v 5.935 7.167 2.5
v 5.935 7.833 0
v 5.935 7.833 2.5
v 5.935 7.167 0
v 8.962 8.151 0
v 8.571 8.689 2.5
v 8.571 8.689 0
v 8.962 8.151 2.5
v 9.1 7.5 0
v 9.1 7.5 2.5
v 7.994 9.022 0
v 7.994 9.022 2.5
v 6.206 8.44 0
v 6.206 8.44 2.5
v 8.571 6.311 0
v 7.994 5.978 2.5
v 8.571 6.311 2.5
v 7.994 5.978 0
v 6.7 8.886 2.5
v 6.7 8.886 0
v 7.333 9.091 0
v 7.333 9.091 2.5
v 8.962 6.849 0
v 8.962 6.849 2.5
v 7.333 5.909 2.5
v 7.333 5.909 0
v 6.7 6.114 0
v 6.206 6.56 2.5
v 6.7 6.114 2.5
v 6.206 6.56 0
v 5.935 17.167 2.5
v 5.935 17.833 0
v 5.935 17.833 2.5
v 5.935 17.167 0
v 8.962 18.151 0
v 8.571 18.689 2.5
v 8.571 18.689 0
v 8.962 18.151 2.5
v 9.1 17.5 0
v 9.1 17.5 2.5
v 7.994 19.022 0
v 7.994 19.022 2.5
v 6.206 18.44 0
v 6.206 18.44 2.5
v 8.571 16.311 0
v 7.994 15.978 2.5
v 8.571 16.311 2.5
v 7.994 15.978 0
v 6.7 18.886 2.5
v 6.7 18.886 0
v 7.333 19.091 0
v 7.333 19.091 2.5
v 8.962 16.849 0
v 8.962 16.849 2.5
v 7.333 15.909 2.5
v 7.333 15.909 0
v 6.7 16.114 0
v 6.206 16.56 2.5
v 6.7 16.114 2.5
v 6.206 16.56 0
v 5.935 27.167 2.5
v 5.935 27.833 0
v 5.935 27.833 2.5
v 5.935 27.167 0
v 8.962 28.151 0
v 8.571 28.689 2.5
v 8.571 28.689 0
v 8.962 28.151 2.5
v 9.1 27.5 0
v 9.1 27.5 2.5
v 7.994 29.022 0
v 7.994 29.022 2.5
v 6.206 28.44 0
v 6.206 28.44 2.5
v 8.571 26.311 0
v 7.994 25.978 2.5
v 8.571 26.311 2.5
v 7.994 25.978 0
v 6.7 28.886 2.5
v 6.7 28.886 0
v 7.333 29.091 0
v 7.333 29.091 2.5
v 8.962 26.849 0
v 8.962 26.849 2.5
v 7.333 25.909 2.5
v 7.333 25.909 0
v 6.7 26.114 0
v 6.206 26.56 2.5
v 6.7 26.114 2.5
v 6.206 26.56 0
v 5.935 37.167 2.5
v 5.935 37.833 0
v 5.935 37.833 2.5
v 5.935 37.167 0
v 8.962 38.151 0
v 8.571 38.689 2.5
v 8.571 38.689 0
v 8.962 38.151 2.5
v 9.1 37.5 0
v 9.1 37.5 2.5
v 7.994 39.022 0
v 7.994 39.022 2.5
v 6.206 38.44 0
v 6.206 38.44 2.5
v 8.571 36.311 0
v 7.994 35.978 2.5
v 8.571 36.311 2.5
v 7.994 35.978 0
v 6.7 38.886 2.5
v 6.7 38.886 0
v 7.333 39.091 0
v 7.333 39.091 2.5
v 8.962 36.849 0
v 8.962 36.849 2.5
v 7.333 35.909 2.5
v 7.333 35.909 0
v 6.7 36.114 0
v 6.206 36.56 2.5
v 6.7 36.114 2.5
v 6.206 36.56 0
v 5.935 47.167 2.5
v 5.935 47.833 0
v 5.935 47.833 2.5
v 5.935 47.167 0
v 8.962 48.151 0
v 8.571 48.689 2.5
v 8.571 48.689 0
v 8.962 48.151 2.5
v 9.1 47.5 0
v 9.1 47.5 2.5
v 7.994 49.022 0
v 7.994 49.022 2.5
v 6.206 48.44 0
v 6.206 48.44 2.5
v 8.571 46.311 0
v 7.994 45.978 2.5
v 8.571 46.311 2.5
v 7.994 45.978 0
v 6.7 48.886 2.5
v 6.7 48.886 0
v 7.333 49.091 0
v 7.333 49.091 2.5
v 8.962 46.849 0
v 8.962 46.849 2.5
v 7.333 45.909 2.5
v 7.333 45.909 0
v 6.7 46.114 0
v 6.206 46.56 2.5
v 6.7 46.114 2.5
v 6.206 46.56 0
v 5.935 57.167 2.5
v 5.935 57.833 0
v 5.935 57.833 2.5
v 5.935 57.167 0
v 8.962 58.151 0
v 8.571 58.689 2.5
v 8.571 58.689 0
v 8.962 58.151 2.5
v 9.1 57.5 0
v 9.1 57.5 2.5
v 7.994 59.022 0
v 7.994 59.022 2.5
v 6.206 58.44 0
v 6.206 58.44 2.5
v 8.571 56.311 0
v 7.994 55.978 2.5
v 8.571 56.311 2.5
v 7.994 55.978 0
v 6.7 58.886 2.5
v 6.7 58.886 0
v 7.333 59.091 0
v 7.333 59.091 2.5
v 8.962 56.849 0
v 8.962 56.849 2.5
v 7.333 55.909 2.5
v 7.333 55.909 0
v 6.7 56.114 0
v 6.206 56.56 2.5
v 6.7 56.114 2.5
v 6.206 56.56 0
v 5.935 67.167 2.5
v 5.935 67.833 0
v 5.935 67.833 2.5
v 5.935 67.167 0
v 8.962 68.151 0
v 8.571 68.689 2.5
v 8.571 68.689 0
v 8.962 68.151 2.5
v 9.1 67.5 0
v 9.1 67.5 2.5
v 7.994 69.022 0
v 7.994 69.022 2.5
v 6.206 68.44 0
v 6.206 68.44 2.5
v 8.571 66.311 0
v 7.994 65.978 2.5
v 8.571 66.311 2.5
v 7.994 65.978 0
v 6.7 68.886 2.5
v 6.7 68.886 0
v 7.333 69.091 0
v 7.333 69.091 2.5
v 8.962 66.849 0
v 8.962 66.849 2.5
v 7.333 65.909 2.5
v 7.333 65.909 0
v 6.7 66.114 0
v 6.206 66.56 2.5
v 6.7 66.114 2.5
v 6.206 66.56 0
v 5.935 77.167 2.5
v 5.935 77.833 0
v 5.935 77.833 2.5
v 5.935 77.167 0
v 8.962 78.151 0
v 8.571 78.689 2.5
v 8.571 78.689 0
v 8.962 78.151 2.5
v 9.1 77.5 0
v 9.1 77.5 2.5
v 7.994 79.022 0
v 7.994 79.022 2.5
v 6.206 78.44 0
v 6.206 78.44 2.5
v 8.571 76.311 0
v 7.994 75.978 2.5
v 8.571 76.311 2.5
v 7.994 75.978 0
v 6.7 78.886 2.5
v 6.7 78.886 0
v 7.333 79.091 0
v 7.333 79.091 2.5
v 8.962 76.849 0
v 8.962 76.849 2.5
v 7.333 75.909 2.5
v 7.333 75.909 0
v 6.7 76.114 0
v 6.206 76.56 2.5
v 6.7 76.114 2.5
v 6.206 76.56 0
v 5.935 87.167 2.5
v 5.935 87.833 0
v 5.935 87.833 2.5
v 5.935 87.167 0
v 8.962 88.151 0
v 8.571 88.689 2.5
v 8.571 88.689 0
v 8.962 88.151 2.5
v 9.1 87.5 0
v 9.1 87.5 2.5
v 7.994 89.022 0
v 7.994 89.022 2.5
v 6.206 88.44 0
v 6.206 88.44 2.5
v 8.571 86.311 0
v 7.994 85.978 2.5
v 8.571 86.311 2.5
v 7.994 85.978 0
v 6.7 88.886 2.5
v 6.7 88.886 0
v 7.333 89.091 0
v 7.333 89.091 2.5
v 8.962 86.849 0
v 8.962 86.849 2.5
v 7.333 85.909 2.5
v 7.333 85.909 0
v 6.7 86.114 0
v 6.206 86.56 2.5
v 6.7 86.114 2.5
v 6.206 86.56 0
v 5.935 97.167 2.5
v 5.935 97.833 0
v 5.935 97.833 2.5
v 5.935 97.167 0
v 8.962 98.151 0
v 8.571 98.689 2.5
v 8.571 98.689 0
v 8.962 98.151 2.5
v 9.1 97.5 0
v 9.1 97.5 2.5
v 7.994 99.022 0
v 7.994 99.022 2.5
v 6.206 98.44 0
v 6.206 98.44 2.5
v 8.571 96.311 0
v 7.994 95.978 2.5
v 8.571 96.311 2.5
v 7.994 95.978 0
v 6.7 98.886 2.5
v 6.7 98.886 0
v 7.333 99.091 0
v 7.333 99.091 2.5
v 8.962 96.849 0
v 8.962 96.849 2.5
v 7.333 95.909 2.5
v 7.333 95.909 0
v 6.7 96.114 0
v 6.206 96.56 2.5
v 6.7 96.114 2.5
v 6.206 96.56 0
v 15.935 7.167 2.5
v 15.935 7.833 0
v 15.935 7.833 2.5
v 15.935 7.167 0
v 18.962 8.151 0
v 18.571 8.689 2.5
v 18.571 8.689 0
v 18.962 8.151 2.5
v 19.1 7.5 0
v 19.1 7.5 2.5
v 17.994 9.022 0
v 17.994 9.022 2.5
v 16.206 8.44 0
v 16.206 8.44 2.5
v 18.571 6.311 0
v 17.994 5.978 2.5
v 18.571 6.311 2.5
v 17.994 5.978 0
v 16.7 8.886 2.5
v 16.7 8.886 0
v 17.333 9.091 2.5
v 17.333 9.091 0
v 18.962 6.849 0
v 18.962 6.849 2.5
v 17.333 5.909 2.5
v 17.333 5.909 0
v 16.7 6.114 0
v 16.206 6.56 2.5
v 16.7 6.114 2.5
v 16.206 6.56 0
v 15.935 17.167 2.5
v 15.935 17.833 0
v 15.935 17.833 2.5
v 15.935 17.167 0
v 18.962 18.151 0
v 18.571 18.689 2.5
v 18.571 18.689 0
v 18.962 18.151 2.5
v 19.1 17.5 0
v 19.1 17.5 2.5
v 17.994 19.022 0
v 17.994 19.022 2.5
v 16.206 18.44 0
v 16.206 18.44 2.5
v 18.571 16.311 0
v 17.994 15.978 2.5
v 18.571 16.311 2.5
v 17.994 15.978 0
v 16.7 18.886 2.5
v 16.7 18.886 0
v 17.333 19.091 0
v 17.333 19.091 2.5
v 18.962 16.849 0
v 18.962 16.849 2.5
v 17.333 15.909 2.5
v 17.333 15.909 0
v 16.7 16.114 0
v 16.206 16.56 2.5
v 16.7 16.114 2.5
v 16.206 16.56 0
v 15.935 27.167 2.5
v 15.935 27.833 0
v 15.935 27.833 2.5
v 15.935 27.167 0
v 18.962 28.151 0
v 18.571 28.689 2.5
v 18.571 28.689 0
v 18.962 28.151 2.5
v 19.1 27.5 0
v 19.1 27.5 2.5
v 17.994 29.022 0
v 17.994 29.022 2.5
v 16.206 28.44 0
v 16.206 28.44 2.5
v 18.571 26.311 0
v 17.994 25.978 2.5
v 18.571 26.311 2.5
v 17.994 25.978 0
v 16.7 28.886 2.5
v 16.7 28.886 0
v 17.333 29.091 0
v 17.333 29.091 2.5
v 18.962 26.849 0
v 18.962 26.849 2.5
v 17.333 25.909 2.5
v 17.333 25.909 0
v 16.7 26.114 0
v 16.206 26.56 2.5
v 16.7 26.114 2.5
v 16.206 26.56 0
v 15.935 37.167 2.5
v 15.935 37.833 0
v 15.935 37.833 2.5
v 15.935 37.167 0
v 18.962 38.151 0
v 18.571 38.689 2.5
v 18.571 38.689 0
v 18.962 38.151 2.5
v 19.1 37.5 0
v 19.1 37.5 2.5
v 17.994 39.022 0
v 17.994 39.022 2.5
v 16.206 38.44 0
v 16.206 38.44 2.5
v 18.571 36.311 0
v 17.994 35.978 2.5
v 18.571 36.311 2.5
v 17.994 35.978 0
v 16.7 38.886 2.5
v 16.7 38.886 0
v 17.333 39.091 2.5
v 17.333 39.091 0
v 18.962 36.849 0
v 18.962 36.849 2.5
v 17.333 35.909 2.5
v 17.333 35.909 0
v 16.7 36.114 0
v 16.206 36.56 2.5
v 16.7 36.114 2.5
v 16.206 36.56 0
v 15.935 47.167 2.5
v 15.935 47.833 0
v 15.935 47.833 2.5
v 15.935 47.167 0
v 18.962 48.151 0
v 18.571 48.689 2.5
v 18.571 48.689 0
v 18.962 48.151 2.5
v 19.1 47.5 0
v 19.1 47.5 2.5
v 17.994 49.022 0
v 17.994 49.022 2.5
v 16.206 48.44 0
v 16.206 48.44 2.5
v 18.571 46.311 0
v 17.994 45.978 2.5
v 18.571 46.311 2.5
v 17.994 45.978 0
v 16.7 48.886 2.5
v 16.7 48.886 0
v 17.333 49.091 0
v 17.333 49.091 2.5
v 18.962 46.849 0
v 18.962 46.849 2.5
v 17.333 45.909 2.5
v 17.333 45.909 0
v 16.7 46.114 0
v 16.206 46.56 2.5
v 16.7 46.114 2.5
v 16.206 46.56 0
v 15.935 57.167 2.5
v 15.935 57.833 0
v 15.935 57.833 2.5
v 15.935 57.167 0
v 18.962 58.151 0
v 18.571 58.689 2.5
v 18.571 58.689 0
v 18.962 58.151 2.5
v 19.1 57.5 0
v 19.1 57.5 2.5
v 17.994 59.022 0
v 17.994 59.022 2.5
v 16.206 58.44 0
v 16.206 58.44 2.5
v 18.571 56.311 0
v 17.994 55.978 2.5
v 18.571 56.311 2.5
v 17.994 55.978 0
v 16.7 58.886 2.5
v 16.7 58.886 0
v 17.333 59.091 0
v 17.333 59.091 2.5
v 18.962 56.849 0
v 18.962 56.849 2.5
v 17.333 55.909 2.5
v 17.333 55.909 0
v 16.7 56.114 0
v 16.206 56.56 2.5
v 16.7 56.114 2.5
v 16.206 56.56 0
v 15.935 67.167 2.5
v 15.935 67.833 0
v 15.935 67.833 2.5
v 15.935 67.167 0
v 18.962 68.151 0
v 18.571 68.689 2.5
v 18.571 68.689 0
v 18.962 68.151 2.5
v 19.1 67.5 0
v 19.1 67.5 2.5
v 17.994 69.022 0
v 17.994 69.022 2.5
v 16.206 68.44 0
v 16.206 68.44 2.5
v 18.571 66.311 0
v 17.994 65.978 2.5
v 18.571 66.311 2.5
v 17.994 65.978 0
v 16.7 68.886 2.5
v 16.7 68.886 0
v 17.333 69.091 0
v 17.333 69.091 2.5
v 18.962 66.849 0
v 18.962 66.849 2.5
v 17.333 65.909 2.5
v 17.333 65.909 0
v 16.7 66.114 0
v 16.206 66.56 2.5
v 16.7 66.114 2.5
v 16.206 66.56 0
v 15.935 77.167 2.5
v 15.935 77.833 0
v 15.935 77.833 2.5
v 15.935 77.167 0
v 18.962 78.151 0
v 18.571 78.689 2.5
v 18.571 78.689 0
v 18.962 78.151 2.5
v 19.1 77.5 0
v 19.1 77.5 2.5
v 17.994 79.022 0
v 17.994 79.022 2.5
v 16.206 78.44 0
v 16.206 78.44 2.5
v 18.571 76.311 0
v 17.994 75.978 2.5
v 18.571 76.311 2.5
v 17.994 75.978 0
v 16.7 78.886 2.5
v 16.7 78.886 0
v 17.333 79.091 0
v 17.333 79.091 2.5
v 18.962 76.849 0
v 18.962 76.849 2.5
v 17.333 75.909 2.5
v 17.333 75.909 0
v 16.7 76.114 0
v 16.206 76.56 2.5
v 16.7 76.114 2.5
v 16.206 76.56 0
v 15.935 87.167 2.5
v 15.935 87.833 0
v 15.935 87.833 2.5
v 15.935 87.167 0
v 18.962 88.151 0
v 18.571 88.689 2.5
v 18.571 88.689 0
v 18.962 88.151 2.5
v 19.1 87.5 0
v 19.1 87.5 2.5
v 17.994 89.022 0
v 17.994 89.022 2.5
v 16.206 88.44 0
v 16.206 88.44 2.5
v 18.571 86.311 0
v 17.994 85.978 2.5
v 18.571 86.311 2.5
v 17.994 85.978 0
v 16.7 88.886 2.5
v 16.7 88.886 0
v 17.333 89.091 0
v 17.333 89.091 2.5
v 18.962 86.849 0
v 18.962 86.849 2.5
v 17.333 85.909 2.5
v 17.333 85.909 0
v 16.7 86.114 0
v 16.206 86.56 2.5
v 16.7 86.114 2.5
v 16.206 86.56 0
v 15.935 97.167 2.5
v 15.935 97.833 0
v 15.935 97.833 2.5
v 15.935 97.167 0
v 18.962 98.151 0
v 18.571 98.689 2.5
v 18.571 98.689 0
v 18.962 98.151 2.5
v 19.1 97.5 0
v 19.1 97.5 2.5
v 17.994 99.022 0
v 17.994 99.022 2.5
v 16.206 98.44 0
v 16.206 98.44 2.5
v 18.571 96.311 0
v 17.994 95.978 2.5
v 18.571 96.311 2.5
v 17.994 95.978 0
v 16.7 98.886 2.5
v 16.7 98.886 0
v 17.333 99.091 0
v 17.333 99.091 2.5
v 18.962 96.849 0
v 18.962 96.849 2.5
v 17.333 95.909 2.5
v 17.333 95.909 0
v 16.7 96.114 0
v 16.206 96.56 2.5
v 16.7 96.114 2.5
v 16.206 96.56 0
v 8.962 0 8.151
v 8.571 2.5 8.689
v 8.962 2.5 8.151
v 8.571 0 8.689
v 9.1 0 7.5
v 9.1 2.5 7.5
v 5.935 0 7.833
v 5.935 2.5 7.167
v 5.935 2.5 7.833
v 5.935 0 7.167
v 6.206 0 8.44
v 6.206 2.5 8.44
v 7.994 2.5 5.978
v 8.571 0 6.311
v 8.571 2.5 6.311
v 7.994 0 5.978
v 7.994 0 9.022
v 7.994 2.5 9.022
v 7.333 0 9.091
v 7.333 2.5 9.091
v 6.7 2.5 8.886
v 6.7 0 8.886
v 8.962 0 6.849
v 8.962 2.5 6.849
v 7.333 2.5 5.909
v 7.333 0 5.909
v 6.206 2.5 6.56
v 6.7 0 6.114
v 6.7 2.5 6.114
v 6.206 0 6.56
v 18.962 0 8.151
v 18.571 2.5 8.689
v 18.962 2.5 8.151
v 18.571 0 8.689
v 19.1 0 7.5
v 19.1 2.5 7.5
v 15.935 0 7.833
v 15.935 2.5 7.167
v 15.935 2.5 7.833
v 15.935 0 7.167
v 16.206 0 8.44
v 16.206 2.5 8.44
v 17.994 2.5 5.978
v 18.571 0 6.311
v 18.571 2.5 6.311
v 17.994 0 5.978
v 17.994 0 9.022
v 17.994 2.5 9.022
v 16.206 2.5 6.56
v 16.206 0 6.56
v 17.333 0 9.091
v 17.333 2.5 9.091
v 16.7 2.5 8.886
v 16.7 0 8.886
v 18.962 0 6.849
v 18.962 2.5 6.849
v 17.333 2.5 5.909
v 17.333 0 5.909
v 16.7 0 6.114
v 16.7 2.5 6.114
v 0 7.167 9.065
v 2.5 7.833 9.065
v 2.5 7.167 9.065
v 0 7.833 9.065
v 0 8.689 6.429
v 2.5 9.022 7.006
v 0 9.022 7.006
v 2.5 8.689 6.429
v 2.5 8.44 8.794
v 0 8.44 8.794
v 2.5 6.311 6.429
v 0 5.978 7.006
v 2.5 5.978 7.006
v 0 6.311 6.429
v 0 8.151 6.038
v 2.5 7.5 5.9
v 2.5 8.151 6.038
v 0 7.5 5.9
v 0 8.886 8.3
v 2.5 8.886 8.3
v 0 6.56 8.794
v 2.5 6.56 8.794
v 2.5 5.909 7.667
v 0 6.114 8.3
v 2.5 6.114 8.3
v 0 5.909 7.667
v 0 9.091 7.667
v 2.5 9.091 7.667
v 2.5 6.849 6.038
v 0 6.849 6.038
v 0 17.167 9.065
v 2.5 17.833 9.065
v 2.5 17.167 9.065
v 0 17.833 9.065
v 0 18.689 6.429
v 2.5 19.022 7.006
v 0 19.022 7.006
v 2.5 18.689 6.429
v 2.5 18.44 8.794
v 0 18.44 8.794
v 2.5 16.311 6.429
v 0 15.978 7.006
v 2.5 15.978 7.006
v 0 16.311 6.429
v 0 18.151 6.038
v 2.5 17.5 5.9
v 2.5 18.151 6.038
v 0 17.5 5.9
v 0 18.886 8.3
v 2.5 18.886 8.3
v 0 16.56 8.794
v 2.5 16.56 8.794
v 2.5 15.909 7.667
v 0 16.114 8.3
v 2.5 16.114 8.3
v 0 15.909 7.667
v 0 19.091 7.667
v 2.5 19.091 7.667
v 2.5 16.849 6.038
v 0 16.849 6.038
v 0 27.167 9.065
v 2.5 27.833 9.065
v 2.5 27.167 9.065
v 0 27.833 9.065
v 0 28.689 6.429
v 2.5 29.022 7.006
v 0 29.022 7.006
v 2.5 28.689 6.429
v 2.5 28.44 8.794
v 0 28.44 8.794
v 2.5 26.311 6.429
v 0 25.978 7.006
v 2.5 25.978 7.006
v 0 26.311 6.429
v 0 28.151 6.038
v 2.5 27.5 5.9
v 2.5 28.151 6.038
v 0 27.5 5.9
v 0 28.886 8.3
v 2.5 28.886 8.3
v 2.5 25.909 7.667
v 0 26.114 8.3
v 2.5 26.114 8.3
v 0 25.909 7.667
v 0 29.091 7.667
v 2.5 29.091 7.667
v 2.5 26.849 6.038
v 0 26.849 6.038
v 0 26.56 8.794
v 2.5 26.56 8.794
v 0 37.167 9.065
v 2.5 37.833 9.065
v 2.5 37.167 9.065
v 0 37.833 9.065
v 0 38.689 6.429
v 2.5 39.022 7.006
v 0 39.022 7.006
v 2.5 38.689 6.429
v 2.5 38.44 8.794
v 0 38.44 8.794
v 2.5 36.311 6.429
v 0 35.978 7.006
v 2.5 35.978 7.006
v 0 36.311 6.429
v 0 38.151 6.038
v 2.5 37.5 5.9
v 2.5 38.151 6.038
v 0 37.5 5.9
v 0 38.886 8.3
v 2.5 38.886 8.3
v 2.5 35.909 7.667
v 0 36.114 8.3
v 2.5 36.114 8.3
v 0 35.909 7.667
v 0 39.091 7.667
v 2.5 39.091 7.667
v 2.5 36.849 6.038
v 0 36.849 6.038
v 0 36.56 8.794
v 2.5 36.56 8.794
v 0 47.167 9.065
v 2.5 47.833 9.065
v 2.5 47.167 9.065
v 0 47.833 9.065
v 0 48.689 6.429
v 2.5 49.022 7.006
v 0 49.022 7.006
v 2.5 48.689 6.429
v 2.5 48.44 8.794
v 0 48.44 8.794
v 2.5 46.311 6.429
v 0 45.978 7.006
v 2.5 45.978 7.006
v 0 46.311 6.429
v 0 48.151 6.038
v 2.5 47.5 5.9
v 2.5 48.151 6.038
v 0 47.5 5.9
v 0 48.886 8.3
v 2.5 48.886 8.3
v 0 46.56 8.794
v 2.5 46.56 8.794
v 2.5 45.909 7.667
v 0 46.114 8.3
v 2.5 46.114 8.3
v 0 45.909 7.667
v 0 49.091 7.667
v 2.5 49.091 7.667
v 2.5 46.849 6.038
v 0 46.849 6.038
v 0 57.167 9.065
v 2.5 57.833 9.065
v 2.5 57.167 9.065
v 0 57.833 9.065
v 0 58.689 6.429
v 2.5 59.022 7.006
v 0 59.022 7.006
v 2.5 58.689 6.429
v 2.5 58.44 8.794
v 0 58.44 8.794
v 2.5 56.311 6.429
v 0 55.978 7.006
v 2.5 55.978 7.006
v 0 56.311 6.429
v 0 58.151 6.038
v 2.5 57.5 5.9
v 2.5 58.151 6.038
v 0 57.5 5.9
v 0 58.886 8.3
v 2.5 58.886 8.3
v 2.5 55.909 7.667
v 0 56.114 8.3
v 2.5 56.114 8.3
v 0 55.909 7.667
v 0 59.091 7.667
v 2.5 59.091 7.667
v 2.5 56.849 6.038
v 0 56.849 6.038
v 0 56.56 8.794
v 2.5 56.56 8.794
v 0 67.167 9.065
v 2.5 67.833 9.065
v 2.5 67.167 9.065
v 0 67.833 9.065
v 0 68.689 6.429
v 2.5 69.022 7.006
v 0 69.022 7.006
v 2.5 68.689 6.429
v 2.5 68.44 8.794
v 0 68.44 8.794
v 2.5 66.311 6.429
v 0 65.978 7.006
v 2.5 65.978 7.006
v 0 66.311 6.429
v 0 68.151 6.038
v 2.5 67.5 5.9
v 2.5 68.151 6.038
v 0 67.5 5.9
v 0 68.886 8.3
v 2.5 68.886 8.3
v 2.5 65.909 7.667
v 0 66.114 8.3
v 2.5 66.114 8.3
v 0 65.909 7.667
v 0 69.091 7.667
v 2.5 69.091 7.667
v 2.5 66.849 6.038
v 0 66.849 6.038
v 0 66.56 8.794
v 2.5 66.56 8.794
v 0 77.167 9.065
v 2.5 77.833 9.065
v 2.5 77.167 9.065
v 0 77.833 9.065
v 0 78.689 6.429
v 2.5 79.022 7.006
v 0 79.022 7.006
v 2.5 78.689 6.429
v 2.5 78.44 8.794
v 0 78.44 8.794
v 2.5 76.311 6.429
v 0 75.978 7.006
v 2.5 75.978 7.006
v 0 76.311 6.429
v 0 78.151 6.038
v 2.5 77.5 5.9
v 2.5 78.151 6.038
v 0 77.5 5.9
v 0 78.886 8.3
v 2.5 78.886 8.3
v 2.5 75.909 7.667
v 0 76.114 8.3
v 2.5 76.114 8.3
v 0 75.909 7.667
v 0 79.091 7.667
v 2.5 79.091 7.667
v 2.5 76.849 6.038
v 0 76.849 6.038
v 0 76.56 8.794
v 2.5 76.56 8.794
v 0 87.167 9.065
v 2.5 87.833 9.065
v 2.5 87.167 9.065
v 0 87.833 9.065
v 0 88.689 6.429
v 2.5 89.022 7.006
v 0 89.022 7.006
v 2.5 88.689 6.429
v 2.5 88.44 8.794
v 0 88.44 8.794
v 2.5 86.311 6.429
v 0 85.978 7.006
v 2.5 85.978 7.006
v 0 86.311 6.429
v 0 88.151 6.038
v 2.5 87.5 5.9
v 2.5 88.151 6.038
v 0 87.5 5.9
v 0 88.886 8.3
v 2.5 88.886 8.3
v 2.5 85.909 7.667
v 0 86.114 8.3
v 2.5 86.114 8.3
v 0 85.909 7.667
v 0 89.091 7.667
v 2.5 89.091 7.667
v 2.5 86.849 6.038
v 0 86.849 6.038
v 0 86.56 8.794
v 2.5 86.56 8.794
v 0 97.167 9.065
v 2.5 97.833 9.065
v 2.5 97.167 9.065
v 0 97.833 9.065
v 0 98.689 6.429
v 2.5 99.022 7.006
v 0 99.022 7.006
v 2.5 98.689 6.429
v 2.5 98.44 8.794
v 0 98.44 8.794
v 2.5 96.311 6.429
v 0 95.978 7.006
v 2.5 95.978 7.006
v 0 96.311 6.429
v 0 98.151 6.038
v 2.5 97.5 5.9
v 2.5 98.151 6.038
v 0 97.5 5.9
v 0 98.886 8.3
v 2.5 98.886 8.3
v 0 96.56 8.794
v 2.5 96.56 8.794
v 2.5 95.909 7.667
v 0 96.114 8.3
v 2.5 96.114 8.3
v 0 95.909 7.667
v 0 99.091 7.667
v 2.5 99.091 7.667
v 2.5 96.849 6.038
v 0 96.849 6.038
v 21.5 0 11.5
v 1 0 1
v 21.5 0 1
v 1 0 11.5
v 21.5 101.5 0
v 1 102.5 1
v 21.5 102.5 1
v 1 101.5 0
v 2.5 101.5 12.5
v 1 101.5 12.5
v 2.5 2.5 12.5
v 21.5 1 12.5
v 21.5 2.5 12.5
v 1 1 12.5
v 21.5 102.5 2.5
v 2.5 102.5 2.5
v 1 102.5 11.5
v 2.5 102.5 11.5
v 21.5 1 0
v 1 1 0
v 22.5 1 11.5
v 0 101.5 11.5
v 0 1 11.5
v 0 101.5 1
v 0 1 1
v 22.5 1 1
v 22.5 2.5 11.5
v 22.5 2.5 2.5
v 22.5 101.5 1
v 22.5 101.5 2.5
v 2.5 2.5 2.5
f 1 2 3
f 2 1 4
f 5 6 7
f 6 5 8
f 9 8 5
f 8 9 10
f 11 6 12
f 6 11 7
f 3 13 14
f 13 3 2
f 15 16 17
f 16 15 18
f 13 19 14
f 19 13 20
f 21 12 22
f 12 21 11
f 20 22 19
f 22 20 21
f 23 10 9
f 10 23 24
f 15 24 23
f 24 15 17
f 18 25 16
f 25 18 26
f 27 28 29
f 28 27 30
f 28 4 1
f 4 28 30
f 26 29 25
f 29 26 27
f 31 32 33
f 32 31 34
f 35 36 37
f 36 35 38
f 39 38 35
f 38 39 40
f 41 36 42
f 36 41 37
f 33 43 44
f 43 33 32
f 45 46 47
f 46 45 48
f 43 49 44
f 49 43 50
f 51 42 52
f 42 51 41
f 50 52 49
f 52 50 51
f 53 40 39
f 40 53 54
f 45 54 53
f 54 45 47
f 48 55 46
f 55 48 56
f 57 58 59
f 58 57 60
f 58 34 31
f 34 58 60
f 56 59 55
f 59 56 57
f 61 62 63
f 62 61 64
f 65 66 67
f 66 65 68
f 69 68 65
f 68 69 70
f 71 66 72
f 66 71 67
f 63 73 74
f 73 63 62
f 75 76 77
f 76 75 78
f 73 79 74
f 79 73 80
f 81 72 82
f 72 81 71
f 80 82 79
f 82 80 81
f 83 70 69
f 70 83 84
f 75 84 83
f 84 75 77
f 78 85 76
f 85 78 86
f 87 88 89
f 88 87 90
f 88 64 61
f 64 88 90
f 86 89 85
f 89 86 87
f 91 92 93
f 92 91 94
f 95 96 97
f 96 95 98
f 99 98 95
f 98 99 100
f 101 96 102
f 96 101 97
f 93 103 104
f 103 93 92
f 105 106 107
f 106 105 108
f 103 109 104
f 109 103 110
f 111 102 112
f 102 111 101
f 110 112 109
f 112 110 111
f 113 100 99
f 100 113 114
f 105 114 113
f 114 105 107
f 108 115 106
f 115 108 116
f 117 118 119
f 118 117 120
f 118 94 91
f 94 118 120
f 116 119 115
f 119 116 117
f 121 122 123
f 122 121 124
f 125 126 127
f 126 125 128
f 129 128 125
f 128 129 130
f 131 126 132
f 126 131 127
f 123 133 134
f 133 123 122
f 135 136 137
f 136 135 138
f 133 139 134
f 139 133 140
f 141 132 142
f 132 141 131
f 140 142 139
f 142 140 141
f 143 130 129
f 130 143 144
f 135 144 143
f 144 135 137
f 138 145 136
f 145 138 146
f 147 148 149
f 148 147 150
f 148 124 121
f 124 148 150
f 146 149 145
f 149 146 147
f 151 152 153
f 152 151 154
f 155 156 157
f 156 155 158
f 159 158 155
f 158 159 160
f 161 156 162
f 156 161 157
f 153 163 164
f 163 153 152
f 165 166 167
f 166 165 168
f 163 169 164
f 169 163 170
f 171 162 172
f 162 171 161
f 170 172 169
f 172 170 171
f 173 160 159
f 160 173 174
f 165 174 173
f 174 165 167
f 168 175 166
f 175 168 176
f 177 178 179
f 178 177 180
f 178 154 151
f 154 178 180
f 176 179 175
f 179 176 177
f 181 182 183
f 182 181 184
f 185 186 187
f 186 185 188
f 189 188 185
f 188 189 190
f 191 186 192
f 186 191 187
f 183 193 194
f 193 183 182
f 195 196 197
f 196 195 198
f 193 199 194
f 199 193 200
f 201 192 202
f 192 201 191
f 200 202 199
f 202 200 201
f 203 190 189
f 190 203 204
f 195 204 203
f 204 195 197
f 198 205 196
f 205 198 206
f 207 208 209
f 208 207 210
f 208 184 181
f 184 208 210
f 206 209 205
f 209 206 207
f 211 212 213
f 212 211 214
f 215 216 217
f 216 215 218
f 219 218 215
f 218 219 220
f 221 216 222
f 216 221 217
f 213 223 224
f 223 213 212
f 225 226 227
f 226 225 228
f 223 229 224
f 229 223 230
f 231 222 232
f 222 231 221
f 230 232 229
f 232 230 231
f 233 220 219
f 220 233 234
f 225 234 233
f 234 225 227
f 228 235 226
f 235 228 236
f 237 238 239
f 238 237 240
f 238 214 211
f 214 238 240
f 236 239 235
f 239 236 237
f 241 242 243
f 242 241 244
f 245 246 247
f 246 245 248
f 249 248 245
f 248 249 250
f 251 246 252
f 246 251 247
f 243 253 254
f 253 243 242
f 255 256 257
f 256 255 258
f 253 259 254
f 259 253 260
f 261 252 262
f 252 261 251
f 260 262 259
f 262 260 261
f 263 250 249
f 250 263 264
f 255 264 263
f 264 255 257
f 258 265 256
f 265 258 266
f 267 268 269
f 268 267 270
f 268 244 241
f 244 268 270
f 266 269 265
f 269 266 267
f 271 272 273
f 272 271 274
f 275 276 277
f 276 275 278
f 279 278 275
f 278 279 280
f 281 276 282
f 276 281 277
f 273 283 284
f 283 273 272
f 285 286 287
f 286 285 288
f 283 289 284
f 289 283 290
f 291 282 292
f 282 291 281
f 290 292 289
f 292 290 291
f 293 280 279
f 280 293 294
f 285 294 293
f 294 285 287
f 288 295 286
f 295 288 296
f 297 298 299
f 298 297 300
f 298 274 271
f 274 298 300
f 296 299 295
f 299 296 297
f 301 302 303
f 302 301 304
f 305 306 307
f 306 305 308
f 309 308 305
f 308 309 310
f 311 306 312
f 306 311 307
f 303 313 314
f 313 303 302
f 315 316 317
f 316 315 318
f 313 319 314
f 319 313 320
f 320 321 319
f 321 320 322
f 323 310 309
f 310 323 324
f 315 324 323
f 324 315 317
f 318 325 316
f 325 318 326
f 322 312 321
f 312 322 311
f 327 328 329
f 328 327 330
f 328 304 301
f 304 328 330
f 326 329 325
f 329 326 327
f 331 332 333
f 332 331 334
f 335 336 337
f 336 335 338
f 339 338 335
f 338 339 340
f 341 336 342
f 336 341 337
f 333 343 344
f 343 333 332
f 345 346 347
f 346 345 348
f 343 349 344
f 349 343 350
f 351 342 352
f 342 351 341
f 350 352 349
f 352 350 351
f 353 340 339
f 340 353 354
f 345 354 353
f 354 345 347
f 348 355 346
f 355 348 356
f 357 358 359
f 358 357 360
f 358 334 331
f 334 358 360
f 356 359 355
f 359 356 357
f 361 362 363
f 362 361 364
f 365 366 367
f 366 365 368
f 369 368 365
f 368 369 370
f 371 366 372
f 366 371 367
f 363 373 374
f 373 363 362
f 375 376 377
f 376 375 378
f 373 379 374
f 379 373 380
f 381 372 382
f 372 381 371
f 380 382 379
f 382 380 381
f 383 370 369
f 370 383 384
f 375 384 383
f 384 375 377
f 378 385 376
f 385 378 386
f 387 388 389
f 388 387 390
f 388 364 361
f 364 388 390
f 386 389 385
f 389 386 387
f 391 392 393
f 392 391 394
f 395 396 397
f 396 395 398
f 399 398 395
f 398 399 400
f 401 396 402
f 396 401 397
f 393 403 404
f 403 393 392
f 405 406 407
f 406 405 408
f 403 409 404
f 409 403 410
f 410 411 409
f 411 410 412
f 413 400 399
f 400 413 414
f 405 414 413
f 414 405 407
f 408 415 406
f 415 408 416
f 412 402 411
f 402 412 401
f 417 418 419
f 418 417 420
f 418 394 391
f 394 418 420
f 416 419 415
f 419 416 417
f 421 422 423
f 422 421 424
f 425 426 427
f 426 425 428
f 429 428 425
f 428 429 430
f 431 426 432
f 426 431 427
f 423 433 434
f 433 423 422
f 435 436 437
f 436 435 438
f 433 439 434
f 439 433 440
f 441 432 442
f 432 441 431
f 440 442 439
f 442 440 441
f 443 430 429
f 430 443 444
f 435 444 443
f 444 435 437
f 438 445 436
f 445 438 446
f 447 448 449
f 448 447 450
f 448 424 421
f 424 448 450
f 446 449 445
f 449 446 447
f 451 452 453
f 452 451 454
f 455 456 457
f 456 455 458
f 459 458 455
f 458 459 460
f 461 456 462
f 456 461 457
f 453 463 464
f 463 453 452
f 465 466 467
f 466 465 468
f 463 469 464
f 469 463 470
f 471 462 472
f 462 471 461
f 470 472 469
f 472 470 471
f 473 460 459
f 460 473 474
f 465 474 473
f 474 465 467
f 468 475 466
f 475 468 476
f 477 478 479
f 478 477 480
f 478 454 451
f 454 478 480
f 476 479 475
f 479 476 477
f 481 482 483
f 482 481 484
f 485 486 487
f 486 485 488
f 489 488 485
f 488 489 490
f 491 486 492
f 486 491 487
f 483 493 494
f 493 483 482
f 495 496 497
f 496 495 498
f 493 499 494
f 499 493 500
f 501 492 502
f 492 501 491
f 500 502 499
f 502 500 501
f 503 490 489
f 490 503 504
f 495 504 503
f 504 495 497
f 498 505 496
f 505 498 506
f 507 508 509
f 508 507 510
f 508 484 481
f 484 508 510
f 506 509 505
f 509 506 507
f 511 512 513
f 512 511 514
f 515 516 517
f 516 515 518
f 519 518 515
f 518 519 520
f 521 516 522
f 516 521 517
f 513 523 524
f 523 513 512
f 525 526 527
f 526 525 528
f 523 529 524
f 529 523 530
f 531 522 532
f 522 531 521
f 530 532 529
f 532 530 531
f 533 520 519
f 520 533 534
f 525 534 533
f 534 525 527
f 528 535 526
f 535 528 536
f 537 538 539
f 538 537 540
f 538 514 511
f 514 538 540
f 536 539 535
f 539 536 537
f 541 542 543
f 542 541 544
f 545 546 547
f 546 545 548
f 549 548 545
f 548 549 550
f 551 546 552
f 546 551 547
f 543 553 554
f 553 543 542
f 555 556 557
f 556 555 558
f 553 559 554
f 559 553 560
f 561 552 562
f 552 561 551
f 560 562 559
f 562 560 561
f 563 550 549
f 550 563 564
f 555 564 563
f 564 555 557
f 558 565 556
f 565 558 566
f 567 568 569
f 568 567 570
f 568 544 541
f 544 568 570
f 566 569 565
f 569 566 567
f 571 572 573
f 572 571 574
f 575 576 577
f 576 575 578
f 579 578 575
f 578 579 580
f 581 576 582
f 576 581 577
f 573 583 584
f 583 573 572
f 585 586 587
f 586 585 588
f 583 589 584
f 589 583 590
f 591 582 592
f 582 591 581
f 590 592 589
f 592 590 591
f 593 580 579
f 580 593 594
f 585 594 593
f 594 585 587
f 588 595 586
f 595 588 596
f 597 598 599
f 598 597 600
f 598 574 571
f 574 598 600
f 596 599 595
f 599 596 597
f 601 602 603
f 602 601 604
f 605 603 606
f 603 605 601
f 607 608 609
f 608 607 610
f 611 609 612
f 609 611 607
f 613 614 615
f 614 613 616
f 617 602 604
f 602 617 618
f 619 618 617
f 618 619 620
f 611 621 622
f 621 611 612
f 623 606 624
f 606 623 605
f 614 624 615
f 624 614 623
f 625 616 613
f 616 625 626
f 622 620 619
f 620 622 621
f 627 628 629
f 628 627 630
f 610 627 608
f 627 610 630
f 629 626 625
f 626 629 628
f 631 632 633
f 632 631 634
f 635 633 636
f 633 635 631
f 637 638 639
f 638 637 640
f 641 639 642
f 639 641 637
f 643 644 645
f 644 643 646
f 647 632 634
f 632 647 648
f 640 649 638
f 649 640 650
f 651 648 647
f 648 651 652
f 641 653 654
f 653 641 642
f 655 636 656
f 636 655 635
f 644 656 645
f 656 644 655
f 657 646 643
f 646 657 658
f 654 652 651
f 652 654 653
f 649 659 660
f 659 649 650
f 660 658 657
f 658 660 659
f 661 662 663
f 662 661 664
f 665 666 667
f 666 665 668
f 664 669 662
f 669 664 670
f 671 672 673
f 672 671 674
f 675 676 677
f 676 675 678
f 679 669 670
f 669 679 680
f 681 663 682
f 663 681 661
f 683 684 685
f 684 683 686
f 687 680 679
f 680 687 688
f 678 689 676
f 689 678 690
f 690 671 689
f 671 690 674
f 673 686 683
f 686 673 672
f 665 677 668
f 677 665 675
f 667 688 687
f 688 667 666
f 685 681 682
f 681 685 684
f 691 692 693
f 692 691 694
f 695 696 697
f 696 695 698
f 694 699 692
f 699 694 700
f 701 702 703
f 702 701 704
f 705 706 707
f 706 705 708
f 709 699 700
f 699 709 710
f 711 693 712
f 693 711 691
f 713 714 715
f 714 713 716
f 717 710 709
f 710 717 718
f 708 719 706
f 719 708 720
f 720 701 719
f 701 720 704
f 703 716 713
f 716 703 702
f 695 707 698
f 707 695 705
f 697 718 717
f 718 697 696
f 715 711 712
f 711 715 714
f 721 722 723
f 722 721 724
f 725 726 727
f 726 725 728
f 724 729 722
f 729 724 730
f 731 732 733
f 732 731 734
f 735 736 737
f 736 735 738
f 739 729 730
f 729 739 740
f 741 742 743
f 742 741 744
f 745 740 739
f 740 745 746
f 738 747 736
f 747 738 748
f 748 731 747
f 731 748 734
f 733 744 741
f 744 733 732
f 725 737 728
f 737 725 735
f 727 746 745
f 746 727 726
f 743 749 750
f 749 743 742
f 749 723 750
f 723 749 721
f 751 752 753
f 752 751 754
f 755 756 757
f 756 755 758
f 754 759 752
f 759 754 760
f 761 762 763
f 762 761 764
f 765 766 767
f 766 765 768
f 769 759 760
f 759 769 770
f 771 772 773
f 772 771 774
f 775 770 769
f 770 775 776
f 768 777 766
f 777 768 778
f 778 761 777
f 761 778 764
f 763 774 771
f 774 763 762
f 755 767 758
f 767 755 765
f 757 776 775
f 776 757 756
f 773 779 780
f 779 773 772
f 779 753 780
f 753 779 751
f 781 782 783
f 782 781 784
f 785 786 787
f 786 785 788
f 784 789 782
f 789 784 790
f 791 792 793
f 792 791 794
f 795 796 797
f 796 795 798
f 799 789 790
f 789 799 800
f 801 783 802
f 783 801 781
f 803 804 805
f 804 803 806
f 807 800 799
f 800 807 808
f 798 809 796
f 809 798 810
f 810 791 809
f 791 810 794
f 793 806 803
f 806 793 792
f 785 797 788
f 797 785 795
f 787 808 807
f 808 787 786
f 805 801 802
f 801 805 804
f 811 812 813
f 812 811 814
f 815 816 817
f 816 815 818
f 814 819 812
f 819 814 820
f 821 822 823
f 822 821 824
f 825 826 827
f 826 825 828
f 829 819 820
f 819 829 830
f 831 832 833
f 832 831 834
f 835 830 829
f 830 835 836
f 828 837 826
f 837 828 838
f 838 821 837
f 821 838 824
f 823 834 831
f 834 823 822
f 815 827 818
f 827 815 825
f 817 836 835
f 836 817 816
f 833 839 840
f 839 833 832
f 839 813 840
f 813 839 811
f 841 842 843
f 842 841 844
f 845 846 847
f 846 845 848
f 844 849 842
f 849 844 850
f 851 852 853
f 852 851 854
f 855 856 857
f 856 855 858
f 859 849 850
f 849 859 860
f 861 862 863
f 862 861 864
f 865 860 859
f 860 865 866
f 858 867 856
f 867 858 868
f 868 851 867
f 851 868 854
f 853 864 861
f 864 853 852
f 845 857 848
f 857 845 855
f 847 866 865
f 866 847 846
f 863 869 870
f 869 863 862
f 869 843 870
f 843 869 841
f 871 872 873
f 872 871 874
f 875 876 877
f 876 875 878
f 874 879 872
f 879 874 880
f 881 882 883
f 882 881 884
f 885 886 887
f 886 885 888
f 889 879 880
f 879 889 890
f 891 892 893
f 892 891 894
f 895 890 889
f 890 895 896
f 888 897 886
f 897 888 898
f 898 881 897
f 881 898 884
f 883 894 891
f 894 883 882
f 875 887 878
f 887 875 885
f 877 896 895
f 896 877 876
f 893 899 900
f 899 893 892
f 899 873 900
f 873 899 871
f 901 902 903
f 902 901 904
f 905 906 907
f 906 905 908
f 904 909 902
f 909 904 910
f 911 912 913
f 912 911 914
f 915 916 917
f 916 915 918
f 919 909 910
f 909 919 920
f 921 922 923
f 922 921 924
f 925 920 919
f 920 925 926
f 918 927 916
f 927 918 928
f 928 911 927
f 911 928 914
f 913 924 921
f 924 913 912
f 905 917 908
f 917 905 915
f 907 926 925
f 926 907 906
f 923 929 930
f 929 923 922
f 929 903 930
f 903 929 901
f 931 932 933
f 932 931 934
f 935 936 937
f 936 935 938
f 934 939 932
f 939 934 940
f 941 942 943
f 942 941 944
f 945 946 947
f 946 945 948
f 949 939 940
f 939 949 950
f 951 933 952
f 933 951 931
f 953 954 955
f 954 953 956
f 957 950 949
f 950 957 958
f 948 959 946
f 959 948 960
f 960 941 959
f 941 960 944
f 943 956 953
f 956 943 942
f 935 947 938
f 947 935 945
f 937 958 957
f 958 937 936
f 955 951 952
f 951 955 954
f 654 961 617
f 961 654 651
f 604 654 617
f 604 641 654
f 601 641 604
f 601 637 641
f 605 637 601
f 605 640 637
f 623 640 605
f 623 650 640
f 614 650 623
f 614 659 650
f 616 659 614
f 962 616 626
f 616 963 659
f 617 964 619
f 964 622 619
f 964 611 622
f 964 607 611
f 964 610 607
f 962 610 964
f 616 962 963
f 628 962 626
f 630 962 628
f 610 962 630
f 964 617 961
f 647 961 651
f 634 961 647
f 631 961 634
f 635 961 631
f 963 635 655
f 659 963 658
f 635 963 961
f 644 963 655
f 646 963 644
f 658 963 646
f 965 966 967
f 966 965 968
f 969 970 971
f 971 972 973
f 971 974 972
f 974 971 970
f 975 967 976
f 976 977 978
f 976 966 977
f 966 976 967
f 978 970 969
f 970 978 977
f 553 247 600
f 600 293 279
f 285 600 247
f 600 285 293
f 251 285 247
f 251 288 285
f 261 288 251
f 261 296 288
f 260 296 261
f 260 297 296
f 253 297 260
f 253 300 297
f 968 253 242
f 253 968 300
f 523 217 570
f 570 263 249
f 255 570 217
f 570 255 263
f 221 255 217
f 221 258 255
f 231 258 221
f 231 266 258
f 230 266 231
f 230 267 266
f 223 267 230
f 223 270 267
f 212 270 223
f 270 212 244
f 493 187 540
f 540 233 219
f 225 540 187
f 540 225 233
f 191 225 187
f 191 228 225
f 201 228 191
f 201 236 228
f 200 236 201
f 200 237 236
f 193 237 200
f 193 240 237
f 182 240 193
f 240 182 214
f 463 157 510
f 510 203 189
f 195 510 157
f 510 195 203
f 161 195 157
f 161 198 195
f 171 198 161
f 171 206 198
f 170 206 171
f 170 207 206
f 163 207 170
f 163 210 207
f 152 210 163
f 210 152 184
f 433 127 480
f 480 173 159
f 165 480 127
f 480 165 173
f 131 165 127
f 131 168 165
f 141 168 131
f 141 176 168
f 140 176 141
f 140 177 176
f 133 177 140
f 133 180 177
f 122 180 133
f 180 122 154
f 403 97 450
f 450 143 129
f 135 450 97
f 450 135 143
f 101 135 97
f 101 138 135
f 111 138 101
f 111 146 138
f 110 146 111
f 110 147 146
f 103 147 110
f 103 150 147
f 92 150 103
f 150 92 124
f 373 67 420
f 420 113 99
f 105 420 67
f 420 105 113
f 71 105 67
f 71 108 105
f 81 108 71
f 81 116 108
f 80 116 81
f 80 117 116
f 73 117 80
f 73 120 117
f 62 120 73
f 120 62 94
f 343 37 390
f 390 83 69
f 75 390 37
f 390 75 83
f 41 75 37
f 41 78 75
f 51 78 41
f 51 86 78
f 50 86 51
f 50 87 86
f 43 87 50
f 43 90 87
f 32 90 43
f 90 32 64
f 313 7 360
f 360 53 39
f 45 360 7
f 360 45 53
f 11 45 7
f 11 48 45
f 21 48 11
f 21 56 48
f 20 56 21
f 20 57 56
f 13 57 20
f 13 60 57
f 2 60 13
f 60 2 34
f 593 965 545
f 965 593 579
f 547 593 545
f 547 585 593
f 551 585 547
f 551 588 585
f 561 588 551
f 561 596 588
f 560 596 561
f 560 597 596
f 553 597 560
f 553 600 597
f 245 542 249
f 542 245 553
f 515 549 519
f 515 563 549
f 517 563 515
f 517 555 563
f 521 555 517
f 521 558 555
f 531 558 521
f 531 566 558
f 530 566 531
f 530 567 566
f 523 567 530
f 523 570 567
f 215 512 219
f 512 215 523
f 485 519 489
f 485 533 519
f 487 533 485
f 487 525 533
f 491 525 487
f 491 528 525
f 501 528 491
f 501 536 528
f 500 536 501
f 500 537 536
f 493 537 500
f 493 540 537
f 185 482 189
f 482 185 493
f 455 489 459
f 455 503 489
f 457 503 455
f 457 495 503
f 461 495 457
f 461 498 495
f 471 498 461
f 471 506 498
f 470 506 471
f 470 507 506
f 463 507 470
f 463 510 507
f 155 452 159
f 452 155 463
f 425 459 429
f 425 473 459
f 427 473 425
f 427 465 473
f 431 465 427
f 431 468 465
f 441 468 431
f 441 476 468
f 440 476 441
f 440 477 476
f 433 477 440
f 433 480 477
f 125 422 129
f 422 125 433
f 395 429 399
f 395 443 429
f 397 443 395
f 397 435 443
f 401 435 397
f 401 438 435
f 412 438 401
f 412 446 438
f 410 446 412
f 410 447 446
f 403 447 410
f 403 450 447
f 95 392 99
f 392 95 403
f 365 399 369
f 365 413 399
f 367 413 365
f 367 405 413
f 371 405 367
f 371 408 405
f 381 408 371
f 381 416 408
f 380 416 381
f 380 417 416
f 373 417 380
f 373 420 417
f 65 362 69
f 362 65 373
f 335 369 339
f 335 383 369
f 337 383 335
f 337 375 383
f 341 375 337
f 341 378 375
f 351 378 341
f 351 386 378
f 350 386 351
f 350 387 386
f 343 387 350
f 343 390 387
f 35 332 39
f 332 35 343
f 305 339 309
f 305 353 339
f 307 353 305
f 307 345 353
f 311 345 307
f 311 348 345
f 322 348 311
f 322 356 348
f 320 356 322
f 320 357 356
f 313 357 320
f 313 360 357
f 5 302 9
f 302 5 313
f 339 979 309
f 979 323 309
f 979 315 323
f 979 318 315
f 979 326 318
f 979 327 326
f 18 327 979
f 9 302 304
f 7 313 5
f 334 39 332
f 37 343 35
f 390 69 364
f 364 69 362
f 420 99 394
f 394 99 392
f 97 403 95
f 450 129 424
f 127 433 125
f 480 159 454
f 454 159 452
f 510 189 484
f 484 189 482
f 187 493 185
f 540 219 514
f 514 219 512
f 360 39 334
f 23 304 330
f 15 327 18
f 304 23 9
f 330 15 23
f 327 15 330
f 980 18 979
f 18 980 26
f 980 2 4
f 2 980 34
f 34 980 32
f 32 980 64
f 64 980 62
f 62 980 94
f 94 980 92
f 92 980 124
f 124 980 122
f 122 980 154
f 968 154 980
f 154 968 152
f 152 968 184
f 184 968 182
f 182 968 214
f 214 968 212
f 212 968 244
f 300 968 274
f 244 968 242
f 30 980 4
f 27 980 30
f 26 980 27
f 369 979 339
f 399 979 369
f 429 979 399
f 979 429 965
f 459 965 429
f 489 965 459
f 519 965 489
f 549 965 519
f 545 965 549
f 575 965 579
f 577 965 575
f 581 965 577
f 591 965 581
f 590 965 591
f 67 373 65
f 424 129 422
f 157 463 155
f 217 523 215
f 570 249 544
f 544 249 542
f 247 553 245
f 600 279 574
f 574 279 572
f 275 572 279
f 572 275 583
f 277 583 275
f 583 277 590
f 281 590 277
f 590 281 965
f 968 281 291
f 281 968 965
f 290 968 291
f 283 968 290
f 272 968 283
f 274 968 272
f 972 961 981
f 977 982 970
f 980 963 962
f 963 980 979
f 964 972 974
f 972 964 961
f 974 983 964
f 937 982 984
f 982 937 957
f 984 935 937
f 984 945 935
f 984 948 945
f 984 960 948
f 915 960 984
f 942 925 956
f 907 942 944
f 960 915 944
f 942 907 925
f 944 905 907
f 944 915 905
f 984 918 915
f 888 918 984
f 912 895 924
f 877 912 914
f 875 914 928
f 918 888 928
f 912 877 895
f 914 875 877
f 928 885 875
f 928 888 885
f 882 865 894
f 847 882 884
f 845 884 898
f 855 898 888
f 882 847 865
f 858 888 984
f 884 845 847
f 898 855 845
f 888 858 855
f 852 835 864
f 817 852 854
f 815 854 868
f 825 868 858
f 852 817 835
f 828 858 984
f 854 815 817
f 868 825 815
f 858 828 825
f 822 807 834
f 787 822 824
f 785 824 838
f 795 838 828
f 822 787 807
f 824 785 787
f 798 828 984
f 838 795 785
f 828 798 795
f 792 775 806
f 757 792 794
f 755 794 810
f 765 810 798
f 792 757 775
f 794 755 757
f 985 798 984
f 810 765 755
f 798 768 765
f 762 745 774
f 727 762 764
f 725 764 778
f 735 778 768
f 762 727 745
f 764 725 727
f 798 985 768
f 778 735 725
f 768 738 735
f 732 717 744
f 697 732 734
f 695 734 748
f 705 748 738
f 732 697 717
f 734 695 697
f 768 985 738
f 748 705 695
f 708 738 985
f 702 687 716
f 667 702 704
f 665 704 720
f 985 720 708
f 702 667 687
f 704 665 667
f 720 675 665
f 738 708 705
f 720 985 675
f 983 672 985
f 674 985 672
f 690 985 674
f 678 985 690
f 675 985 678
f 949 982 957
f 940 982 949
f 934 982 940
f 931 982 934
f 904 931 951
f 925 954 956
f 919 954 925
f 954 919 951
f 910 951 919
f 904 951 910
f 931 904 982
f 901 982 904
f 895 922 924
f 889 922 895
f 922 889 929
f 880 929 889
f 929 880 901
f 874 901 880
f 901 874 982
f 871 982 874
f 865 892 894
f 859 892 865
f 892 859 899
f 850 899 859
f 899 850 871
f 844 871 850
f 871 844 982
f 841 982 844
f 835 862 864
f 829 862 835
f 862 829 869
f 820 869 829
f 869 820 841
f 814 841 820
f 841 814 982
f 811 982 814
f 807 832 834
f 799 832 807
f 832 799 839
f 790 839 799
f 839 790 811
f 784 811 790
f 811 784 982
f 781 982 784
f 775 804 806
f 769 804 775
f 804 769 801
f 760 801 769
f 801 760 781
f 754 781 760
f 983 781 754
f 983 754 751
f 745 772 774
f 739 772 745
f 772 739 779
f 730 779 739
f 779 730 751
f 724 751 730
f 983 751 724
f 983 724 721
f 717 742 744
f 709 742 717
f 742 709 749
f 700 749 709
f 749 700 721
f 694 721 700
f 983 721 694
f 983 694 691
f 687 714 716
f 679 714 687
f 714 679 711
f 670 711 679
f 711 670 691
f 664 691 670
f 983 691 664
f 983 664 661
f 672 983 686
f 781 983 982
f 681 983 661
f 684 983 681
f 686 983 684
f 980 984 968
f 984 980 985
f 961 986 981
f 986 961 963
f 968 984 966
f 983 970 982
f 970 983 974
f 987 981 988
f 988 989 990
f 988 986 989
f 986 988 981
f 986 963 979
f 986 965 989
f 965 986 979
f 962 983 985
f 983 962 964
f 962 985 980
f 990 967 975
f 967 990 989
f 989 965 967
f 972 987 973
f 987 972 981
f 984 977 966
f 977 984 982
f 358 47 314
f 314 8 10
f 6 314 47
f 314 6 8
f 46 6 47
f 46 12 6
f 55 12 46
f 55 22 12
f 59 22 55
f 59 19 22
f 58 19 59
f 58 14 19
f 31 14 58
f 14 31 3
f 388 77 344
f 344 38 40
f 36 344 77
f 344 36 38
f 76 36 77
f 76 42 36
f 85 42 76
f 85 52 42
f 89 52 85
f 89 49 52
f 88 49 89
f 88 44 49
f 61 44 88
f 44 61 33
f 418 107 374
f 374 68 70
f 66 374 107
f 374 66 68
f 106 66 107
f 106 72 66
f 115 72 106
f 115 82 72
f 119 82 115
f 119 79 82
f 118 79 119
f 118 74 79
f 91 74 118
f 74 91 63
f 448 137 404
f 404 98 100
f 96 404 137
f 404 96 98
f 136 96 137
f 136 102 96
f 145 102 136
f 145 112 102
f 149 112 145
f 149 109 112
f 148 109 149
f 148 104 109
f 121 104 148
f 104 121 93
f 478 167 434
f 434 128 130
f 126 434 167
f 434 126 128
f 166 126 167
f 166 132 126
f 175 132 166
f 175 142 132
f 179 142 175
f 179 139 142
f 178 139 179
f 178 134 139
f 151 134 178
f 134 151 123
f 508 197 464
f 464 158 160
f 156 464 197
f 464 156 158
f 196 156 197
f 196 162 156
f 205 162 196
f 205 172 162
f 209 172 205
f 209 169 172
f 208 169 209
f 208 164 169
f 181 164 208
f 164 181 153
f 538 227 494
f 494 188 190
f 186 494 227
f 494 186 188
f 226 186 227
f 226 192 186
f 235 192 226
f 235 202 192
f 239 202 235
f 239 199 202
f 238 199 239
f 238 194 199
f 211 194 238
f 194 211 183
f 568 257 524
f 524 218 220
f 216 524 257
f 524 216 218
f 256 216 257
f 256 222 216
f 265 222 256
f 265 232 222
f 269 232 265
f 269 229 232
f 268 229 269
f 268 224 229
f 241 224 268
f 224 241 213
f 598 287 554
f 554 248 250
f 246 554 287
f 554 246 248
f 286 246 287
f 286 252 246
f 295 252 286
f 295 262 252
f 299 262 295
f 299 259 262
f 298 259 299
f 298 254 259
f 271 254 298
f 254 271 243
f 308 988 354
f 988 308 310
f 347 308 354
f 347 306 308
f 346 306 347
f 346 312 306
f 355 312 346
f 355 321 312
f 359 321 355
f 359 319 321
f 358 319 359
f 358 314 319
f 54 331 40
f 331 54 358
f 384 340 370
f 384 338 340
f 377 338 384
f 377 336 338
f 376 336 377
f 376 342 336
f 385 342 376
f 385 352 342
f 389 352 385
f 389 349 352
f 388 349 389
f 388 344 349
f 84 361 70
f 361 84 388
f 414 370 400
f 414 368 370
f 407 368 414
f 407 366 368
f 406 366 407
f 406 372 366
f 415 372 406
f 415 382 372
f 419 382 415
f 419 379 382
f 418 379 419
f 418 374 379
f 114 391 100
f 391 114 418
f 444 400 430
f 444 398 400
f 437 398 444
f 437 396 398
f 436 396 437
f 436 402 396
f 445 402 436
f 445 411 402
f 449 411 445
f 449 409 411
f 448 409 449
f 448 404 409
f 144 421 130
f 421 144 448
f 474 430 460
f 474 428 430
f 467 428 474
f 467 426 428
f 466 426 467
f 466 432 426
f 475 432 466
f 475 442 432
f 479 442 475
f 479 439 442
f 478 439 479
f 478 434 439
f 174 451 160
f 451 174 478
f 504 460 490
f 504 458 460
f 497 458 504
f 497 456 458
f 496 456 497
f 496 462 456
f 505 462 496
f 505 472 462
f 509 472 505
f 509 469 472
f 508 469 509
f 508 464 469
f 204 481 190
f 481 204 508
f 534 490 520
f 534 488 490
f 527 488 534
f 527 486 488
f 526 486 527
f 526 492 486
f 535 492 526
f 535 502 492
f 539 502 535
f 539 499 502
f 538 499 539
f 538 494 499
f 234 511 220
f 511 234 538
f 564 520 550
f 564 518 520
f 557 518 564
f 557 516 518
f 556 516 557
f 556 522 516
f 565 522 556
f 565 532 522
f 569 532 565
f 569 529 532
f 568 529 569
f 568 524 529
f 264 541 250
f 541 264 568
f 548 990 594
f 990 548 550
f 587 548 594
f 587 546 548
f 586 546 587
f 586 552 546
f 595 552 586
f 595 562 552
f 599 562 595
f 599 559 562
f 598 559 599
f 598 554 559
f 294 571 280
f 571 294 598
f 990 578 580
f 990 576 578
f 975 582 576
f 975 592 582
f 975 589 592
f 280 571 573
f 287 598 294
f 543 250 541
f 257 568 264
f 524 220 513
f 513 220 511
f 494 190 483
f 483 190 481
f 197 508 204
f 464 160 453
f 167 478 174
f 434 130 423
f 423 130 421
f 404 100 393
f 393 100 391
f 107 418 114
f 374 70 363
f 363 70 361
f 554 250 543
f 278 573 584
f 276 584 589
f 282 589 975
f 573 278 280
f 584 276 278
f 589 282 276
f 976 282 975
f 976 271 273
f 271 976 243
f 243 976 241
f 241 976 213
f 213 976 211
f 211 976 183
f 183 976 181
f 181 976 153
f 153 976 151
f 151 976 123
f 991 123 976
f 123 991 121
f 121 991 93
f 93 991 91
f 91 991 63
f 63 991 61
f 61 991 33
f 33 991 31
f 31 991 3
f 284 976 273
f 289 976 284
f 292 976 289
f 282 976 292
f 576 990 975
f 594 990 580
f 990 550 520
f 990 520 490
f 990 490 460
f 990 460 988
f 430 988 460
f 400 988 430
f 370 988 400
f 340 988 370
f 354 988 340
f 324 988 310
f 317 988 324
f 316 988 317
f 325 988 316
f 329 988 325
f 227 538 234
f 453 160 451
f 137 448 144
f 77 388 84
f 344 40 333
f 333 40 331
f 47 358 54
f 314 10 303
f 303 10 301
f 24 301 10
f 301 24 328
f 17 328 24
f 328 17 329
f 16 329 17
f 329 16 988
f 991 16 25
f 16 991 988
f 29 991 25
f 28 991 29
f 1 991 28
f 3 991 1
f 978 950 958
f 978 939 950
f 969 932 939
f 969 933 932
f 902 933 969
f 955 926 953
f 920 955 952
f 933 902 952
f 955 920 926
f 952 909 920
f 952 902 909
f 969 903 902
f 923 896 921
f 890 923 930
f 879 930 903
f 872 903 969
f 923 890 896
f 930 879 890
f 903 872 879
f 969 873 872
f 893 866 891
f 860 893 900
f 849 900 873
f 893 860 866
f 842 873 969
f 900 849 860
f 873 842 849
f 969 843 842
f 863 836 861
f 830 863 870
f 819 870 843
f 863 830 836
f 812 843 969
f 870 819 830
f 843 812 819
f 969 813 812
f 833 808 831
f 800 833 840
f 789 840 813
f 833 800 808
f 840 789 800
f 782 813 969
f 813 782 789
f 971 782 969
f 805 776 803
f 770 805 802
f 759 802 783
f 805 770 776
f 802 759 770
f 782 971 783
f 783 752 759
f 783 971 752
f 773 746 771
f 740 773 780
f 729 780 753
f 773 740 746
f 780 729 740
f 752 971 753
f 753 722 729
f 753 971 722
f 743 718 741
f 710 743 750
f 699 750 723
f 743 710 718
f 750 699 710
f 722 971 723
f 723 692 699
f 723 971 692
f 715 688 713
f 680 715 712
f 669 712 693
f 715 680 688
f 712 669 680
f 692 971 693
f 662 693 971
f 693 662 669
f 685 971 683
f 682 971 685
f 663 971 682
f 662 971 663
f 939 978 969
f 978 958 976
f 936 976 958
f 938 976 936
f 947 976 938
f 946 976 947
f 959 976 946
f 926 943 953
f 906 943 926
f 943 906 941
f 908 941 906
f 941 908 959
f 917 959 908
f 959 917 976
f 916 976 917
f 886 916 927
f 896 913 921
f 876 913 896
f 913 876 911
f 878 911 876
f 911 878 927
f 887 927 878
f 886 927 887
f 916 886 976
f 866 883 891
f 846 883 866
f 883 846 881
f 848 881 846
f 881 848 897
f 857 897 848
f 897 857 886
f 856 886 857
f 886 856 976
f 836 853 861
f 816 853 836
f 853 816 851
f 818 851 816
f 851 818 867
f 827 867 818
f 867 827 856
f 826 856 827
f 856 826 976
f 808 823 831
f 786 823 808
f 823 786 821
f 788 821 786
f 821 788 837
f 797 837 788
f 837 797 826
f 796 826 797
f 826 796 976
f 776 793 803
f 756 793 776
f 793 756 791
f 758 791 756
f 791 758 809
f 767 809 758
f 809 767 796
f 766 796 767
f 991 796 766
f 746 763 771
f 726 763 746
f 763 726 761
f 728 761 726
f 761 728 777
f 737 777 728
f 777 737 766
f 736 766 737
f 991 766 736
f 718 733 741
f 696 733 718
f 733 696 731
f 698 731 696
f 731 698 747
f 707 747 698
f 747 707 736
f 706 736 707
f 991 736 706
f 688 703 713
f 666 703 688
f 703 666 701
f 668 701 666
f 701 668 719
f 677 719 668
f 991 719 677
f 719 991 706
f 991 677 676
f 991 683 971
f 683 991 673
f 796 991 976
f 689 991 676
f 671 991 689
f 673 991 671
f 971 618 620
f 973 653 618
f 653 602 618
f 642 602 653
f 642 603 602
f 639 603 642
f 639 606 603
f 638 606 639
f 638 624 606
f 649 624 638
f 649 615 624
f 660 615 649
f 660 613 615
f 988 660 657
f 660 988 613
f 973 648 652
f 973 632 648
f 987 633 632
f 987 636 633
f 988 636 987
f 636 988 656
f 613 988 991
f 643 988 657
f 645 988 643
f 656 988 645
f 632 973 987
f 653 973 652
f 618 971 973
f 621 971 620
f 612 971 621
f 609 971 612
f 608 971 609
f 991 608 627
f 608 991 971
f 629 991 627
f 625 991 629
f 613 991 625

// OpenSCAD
/*  
        Bin.scad
        M3Z core library 1.0.0
*/

//BEGIN OPTIONS - edit these parameters to generate custom parts of this form.

N = 2; //whole number of 10mm units along the X axis
M = 10; //whole number of 10mm units along the Y axis
H = 1; //whole number of 10mm units along the Z axis.

THICKNESS = 2.5; //Nominal 2.5mm - thickness of the walls of the part

CHAMFER_DEPTH = 1.0; //Default 1.0mm

HOLE_DIAMETER = 3.2; //Nominal 3.0mm - common diameter of holes throughout

HOLE_FACES = 15; //Default 20 - higher number => slower render, smoother holes

//END OPTIONS - edit all else at your own risk

//Modules

module chamferCube(dimensions,depth){
    //where dimensions is a vector e.g. [10,20,30] and depth is the depth of the chamfer.
    
    f=2*depth;
    
    octaPoints = [ 
                    [1,0,0],
                    [0,1,0],
                    [-1,0,0],
                    [0,-1,0],
                    [0,0,1],
                    [0,0,-1]
                ];

    octaFaces = [   
                    [0,4,1],
                    [1,4,2],
                    [2,4,3],
                    [3,4,0],
                    [0,1,5],
                    [1,2,5],
                    [2,3,5],
                    [3,0,5] 
                ];
    translate([depth,depth,depth])
    minkowski(){
        cube([dimensions[0]-f,dimensions[1]-f,dimensions[2]-f]);
        polyhedron(octaPoints*depth, octaFaces);
    }
}

//variables (derived and not to be edited)

bodyWidth = N * 10 + THICKNESS;
bodyLength = M * 10 + THICKNESS;
bodyHeight = H * 10 + THICKNESS;
bodyDims = [bodyWidth,bodyLength,bodyHeight];

//Part Generating Code

difference(){
    chamferCube(bodyDims,1);
    translate([THICKNESS,THICKNESS,THICKNESS]){
        cube([N*15,M*15,H*15]);
    }
    
    for(i = [0:N-1]){
        for(j = [0:M-1]){
            translate([THICKNESS+5+10*i, THICKNESS+5+10*j,0]){
                cylinder(h= bodyHeight*3, d = HOLE_DIAMETER, center = true, $fn = HOLE_FACES);
            }
        }
    }
    for(i = [0:N-1]){
        for(k = [0:H-1]){
            translate([THICKNESS+5+10*i, 0, THICKNESS+5+10*k]){
                rotate(90,[1,0,0]){
                    cylinder(h=bodyLength*3, d=HOLE_DIAMETER, center = true, $fn = HOLE_FACES);
                }
            }
        }
    }
    for(j = [0:M-1]){
        for(k = [0:H-1]){
            translate([0,THICKNESS+5+10*j,THICKNESS+5+10*k]){
                rotate(90,[0,1,0]){
                    cylinder(h=bodyWidth*3, d=HOLE_DIAMETER, center = true, $fn = HOLE_FACES);
                }
            }
        }
    }
}
    
